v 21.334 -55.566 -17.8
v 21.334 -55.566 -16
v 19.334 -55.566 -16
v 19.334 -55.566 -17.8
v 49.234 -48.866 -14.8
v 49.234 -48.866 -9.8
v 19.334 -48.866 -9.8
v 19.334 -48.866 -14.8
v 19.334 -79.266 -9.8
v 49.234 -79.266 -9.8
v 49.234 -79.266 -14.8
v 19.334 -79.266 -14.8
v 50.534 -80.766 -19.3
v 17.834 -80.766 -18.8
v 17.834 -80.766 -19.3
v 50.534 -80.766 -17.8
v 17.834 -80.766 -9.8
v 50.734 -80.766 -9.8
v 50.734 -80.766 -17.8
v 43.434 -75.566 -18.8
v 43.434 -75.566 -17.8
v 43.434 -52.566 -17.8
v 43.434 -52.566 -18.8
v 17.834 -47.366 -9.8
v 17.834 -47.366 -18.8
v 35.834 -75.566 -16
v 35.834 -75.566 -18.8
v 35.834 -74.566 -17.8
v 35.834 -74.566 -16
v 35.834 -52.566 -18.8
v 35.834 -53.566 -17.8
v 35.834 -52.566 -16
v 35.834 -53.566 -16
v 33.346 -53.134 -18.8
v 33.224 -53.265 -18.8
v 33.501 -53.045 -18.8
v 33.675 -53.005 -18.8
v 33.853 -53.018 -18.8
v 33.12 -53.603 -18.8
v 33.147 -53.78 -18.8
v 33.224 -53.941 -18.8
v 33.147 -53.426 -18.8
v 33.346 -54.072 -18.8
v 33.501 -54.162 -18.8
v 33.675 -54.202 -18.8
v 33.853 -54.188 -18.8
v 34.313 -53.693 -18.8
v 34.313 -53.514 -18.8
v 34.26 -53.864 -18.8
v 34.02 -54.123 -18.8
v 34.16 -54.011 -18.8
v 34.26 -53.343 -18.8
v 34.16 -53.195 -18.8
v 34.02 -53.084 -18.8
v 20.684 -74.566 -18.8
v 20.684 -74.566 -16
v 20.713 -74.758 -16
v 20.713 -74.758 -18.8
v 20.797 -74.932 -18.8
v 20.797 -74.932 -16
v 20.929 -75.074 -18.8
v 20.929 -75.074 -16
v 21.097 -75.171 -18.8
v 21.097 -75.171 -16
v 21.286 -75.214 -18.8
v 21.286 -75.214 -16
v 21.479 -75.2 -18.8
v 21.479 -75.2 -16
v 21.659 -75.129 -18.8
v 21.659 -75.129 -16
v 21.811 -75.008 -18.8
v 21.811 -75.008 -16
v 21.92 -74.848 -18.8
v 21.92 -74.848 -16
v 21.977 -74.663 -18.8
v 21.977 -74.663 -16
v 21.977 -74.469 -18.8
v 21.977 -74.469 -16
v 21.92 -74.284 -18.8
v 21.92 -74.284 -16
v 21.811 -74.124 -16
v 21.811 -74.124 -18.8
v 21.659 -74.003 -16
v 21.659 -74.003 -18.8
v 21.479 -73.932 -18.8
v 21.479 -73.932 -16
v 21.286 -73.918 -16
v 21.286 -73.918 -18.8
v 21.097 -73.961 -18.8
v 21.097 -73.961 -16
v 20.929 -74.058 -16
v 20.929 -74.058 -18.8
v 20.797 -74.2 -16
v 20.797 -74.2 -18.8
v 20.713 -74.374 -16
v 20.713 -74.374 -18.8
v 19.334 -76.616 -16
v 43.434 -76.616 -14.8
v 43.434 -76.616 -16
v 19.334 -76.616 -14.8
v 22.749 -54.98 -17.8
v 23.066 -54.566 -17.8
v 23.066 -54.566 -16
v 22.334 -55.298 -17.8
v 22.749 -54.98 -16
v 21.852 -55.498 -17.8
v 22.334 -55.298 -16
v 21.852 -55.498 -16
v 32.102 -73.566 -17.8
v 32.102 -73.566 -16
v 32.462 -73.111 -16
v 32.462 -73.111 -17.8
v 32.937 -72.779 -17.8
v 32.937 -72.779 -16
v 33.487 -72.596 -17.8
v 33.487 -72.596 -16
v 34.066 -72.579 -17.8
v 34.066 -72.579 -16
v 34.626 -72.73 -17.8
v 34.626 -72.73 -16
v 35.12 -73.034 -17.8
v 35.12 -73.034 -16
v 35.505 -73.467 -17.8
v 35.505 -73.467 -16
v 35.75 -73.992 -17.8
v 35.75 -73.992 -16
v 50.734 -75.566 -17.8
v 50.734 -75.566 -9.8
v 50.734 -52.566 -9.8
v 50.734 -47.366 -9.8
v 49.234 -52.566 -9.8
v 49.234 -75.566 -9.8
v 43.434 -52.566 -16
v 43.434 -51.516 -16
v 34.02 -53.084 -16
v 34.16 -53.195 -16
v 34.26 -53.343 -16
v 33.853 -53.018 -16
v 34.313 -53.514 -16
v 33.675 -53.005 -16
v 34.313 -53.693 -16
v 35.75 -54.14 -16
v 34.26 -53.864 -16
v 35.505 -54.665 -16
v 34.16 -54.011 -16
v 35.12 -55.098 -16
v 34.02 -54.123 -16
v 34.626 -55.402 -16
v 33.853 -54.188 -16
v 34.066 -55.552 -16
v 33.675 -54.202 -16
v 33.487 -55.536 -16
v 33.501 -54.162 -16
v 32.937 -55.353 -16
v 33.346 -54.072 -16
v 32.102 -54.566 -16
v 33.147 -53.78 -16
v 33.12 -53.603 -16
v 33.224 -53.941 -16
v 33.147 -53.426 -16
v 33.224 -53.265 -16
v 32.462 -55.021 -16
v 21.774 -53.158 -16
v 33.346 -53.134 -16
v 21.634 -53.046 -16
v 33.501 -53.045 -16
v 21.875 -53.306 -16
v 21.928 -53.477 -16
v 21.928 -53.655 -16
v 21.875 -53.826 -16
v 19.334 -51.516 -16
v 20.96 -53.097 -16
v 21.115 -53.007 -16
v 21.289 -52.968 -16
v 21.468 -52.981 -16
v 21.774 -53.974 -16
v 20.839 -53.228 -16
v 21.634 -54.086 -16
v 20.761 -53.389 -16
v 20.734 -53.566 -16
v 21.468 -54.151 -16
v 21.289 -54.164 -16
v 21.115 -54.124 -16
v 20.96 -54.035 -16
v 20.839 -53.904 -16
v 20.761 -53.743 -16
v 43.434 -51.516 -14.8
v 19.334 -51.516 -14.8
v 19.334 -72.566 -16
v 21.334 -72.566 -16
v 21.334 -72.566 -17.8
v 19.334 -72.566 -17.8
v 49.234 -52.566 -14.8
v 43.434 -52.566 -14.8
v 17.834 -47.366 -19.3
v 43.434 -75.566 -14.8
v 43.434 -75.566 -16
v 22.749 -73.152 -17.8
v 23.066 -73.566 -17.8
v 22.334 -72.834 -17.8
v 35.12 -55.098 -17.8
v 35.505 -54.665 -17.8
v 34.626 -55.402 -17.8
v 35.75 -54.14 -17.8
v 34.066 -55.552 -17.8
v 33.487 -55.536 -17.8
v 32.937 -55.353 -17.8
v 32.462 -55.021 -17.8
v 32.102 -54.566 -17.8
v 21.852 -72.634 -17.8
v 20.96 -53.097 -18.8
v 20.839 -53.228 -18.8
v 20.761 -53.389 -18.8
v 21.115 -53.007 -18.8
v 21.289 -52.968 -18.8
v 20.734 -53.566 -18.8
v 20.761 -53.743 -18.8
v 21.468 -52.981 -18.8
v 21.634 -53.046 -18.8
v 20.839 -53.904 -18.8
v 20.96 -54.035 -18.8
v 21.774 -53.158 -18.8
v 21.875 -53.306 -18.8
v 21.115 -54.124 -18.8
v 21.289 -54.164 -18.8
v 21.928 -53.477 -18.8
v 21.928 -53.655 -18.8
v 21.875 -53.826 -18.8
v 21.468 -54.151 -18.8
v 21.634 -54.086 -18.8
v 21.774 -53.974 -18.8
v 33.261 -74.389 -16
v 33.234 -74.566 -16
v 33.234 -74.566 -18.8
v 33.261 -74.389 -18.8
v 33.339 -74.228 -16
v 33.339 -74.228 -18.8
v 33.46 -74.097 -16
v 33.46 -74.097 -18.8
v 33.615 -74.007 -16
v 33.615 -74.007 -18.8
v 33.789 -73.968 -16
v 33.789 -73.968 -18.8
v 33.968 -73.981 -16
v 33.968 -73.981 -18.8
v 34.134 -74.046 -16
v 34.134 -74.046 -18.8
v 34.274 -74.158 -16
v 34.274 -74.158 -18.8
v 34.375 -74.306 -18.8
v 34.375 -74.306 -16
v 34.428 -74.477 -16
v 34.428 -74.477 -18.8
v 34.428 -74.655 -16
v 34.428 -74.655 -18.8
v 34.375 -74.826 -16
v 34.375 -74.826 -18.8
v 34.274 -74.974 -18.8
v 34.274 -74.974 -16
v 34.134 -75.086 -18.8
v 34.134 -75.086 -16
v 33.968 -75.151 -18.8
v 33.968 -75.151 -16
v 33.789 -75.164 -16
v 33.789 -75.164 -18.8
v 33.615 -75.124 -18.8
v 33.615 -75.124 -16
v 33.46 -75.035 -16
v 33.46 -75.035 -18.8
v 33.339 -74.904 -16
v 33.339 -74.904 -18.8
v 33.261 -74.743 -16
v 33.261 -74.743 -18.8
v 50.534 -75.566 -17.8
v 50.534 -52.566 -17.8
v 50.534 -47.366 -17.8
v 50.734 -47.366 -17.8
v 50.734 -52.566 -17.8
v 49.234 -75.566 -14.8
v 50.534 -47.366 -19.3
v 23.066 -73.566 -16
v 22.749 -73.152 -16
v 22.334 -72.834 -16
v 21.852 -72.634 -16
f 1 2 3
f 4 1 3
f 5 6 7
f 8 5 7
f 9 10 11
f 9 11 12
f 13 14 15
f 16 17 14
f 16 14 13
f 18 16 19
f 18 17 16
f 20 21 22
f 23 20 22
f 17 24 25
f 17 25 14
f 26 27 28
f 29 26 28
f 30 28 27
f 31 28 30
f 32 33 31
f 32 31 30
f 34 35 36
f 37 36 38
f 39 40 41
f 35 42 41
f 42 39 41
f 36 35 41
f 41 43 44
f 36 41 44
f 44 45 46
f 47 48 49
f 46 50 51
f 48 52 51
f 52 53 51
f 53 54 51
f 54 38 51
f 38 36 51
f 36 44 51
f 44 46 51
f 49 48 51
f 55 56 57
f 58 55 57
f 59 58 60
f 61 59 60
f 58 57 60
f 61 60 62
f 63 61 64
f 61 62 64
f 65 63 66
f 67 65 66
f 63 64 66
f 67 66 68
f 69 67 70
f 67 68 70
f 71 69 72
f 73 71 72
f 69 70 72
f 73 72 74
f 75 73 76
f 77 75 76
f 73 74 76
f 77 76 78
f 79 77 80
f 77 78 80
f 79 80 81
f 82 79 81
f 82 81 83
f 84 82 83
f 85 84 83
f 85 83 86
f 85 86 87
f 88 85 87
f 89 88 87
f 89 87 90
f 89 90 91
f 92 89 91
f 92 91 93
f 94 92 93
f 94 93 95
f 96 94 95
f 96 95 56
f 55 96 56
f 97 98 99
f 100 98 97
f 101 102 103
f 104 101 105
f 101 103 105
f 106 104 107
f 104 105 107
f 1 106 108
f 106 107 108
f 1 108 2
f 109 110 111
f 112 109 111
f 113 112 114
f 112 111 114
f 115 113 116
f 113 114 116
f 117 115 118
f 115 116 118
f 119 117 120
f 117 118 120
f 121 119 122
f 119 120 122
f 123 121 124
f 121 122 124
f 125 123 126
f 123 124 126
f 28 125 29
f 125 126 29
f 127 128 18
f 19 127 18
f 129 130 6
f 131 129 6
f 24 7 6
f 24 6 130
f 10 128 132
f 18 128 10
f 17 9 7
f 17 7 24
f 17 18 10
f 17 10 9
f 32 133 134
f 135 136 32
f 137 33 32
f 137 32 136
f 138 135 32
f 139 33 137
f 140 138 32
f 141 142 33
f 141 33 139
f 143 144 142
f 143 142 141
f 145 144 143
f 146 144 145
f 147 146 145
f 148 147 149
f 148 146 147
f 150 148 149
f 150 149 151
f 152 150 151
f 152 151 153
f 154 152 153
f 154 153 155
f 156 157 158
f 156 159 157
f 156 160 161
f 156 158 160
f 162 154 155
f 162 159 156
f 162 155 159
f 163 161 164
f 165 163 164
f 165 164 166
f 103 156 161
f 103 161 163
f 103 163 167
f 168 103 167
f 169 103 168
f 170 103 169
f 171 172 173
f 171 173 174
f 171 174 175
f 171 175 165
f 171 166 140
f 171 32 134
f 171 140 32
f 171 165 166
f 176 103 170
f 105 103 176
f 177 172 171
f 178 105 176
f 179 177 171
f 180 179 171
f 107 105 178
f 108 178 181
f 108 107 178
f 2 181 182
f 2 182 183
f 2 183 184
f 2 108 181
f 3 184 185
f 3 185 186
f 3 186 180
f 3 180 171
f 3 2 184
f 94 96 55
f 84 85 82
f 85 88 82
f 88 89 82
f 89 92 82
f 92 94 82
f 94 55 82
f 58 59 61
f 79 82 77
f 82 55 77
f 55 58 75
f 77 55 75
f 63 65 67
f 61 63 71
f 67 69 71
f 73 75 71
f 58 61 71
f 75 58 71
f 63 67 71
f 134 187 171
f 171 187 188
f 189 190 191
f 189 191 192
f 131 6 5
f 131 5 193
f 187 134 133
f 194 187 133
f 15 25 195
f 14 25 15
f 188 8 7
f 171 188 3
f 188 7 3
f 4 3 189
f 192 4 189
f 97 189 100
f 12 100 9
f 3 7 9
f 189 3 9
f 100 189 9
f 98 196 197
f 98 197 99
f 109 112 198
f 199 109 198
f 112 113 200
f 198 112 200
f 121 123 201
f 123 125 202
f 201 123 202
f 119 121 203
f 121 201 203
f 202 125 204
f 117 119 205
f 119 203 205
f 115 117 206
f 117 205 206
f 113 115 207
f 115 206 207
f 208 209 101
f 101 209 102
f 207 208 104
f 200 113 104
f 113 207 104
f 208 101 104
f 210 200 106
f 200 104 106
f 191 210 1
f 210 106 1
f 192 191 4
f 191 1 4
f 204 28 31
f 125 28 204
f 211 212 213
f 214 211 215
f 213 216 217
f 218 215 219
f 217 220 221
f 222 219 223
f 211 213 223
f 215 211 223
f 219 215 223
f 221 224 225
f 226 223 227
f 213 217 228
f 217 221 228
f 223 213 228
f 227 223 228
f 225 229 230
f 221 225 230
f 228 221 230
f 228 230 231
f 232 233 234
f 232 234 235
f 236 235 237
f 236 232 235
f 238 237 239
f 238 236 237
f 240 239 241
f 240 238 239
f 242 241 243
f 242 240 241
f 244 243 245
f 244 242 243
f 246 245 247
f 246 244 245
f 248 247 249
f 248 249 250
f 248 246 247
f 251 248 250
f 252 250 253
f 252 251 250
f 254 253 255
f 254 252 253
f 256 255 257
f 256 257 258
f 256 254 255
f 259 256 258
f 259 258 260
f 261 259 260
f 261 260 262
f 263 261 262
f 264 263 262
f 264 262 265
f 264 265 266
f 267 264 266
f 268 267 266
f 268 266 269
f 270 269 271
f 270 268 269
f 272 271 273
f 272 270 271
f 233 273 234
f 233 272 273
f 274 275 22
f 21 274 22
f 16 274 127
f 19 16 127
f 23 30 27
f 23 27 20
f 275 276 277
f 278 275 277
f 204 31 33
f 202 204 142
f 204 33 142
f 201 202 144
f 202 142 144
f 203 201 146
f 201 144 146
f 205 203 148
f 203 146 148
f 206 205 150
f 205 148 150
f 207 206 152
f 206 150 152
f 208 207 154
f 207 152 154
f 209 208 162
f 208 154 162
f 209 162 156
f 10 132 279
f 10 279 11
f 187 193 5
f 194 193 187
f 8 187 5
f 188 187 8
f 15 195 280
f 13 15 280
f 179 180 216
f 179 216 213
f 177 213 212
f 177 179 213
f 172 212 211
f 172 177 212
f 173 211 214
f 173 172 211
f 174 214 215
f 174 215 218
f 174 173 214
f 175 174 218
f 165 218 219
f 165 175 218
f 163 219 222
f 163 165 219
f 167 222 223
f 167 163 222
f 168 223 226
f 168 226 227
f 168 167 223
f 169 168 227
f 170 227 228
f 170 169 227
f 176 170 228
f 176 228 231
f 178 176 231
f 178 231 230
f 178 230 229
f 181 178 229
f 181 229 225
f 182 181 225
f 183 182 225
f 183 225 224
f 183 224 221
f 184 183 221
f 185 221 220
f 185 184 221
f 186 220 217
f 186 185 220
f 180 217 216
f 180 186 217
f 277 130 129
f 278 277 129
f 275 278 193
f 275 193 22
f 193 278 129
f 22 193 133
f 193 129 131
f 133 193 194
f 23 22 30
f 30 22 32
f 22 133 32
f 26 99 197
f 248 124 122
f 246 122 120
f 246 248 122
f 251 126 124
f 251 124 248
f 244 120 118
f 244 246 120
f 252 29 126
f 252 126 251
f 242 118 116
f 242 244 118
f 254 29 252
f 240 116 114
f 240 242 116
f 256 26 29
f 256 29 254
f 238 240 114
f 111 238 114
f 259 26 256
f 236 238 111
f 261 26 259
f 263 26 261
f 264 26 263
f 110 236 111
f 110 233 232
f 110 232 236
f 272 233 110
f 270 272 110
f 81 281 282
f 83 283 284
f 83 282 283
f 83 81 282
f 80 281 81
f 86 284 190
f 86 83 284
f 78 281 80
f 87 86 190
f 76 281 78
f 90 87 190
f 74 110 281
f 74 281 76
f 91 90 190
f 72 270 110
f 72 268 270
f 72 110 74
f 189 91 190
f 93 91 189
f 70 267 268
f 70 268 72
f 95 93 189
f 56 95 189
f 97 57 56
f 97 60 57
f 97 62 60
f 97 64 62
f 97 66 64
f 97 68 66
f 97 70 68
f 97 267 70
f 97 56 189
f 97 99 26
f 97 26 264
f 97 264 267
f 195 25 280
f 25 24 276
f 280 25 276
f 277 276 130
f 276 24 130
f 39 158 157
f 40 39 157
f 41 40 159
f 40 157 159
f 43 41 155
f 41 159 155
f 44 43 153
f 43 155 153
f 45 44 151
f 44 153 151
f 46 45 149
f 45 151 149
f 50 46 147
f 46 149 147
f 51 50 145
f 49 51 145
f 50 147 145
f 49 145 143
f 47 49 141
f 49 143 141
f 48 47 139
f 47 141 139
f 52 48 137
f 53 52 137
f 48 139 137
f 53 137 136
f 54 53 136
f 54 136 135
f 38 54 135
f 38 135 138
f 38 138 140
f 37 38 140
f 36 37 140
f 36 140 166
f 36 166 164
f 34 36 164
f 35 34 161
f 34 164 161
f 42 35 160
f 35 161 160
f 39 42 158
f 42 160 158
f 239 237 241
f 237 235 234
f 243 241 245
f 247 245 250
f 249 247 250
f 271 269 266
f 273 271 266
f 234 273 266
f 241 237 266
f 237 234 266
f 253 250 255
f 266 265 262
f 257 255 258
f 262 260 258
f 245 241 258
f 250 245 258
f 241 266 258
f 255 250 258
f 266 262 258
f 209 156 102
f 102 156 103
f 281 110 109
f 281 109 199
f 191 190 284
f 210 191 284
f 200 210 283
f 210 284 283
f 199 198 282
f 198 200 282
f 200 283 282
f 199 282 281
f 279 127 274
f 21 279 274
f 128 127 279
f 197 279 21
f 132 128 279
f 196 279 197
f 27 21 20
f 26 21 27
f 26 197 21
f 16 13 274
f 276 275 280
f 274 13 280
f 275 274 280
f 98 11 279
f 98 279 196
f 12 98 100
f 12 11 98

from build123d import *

# Parameters (mm, degrees)
RECTANGLE077_W         = 0.2
RECTANGLE077_H         = 33.4
EXTRUDE207_DEPTH       = 1.5
RECTANGLE072_W         = 32.9
RECTANGLE072_H         = 33.4
EXTRUDE172_DEPTH       = 0.5
CIRCLE037_R            = 0.6
EXTRUDE166_DEPTH       = 2.8
CIRCLE036_R            = 0.6
EXTRUDE163_DEPTH       = 2.8
CIRCLE038_R            = 0.6
EXTRUDE165_DEPTH       = 2.8
CIRCLE040_R            = 0.65
EXTRUDE167_DEPTH       = 10
CIRCLE018_R            = 2
EXTRUDE155_DEPTH       = 2.1
RECTANGLE065_W         = 2
RECTANGLE065_H         = 1
EXTRUDE156_DEPTH       = 2.1
RECTANGLE064_W         = 2
RECTANGLE064_H         = 1
EXTRUDE153_DEPTH       = 2.1
CIRCLE019_R            = 2
EXTRUDE152_DEPTH       = 2.1
RECTANGLE066_W         = 1
RECTANGLE066_H         = 1
EXTRUDE150_DEPTH       = 2.1
CIRCLE020_R            = 2
EXTRUDE149_DEPTH       = 2.1
RECTANGLE070_W         = 7.6
RECTANGLE070_H         = 23
EXTRUDE162_DEPTH       = 2.8
RECTANGLE061_W         = 24.1
RECTANGLE061_H         = 25.1
EXTRUDE117_DEPTH       = 6.2
RECTANGLE063_W         = 1.5
RECTANGLE063_H         = 23
EXTRUDE128_DEPTH       = 8
RECTANGLE060_W         = 14.4
RECTANGLE060_H         = 23
EXTRUDE141_DEPTH       = 8
RECTANGLE059_W         = 15.5
RECTANGLE059_H         = 19
EXTRUDE140_DEPTH       = 8
RECTANGLE062_W         = 29.9
RECTANGLE062_H         = 30.4
EXTRUDE116_DEPTH       = 5
RECTANGLE053_W         = 32.9
RECTANGLE053_H         = 33.4
EXTRUDE107_DEPTH       = 9
RECTANGLE067_W         = 1
RECTANGLE067_H         = 1
EXTRUDE159_DEPTH       = 2.1
CIRCLE021_R            = 2
EXTRUDE158_DEPTH       = 2.1
CUT078_PLACEMENT_ANGLE = 180


with BuildPart() as extrude207:
    # Rectangle077 → Extrude207 (new body)
    with BuildSketch(Plane(origin=(50.534308, -80.765974, -19.3), x_dir=(1, 0, 0), z_dir=(0, 0, 1))):
        with Locations((0.1, 16.7)):
            Rectangle(RECTANGLE077_W, RECTANGLE077_H)
    extrude(amount=EXTRUDE207_DEPTH)


with BuildPart() as extrude172:
    # Rectangle072 (on Cut) → Extrude172 (new body)
    with BuildSketch(Plane(origin=(17.834308, -47.365974, -18.8), x_dir=(1, 0, 0), z_dir=(0, 0, -1))):
        with Locations((16.45, 16.7)):
            Rectangle(RECTANGLE072_W, RECTANGLE072_H)
    extrude(amount=EXTRUDE172_DEPTH)


with BuildPart() as extrude166:
    # Circle037 → Extrude166 (new body)
    with BuildSketch(Plane(origin=(67.748726, -53.60327, -3.6), x_dir=(1, 0, 0), z_dir=(0, 0, -1))):
        Circle(CIRCLE037_R)
    extrude(amount=-EXTRUDE166_DEPTH)


with BuildPart() as extrude163:
    # Circle036 → Extrude163 (new body)
    with BuildSketch(Plane(origin=(80.134308, -53.565974, -3.6), x_dir=(1, 0, 0), z_dir=(0, 0, 1))):
        Circle(CIRCLE036_R)
    extrude(amount=EXTRUDE163_DEPTH)


with BuildPart() as extrude165:
    # Circle038 → Extrude165 (new body)
    with BuildSketch(Plane(origin=(67.634308, -74.565974, -3.6), x_dir=(1, 0, 0), z_dir=(0, 0, 1))):
        Circle(CIRCLE038_R)
    extrude(amount=EXTRUDE165_DEPTH)


with BuildPart() as extrude167:
    # Circle040 (on Cut) → Extrude167 (new body)
    with BuildSketch(Plane(origin=(80.134308, -74.565974, -3.6), x_dir=(1, 0, 0), z_dir=(0, 0, -1))):
        Circle(CIRCLE040_R)
    extrude(amount=-EXTRUDE167_DEPTH)


with BuildPart() as extrude155:
    # Circle018 → Extrude155 (new body)
    with BuildSketch(Plane(origin=(80.134308, -53.565974, -3.6), x_dir=(1, 0, 0), z_dir=(0, 0, 1))):
        Circle(CIRCLE018_R)
    extrude(amount=EXTRUDE155_DEPTH)


with BuildPart() as fusion026:
    # Rectangle065 → Extrude156 (new body)
    with BuildSketch(Plane(origin=(80.134308, -55.565974, -3.6), x_dir=(1, 0, 0), z_dir=(0, 0, 1))):
        with Locations((1, 0.5)):
            Rectangle(RECTANGLE065_W, RECTANGLE065_H)
    extrude(amount=EXTRUDE156_DEPTH)

    # Fusion026: union Extrude155
    add(extrude155.part)


with BuildPart() as extrude153:
    # Rectangle064 → Extrude153 (new body)
    with BuildSketch(Plane(origin=(80.134308, -73.565974, -3.6), x_dir=(1, 0, 0), z_dir=(0, 0, 1))):
        with Locations((1, 0.5)):
            Rectangle(RECTANGLE064_W, RECTANGLE064_H)
    extrude(amount=EXTRUDE153_DEPTH)


with BuildPart() as fusion032:
    # Circle019 → Extrude152 (new body)
    with BuildSketch(Plane(origin=(80.134308, -74.565974, -3.6), x_dir=(1, 0, 0), z_dir=(0, 0, 1))):
        Circle(CIRCLE019_R)
    extrude(amount=EXTRUDE152_DEPTH)

    # Fusion032: union Extrude153
    add(extrude153.part)


with BuildPart() as extrude150:
    # Rectangle066 → Extrude150 (new body)
    with BuildSketch(Plane(origin=(65.634308, -75.565974, -3.6), x_dir=(1, 0, 0), z_dir=(0, 0, 1))):
        with Locations((0.5, 0.5)):
            Rectangle(RECTANGLE066_W, RECTANGLE066_H)
    extrude(amount=EXTRUDE150_DEPTH)


with BuildPart() as fusion024:
    # Circle020 → Extrude149 (new body)
    with BuildSketch(Plane(origin=(67.634308, -74.565974, -3.6), x_dir=(1, 0, 0), z_dir=(0, 0, 1))):
        Circle(CIRCLE020_R)
    extrude(amount=EXTRUDE149_DEPTH)

    # Fusion024: union Extrude150
    add(extrude150.part)


with BuildPart() as extrude162:
    # Rectangle070 → Extrude162 (new body)
    with BuildSketch(Plane(origin=(58.034308, -75.565974, -3.6), x_dir=(1, 0, 0), z_dir=(0, 0, 1))):
        with Locations((3.8, 11.5)):
            Rectangle(RECTANGLE070_W, RECTANGLE070_H)
    extrude(amount=EXTRUDE162_DEPTH)


with BuildPart() as extrude117:
    # Rectangle061 → Extrude117 (new body)
    with BuildSketch(Plane(origin=(58.034308, -51.515974, -9.8), x_dir=(1, 0, 0), z_dir=(0, 0, -1))):
        with Locations((12.05, 12.55)):
            Rectangle(RECTANGLE061_W, RECTANGLE061_H)
    extrude(amount=-EXTRUDE117_DEPTH)


with BuildPart() as extrude128:
    # Rectangle063 → Extrude128 (new body)
    with BuildSketch(Plane(origin=(50.734308, -75.565974, -9.8), x_dir=(1, 0, 0), z_dir=(0, 0, 1))):
        with Locations((0.75, 11.5)):
            Rectangle(RECTANGLE063_W, RECTANGLE063_H)
    extrude(amount=EXTRUDE128_DEPTH)


with BuildPart() as extrude141:
    # Rectangle060 → Extrude141 (new body)
    with BuildSketch(Plane(origin=(52.234308, -52.565974, -9.8), x_dir=(1, 0, 0), z_dir=(0, 0, -1))):
        with Locations((7.2, 11.5)):
            Rectangle(RECTANGLE060_W, RECTANGLE060_H)
    extrude(amount=-EXTRUDE141_DEPTH)


with BuildPart() as extrude140:
    # Rectangle059 → Extrude140 (new body)
    with BuildSketch(Plane(origin=(66.634308, -54.565974, -9.8), x_dir=(1, 0, 0), z_dir=(0, 0, -1))):
        with Locations((7.75, 9.5)):
            Rectangle(RECTANGLE059_W, RECTANGLE059_H)
    extrude(amount=-EXTRUDE140_DEPTH)


with BuildPart() as extrude116:
    # Rectangle062 → Extrude116 (new body)
    with BuildSketch(Plane(origin=(52.234308, -48.865974, -9.8), x_dir=(1, 0, 0), z_dir=(0, 0, -1))):
        with Locations((14.95, 15.2)):
            Rectangle(RECTANGLE062_W, RECTANGLE062_H)
    extrude(amount=-EXTRUDE116_DEPTH)


with BuildPart() as cut074:
    # Rectangle053 → Extrude107 (new body)
    with BuildSketch(Plane(origin=(50.734308, -47.365974, -9.8), x_dir=(1, 0, 0), z_dir=(0, 0, -1))):
        with Locations((16.45, 16.7)):
            Rectangle(RECTANGLE053_W, RECTANGLE053_H)
    extrude(amount=-EXTRUDE107_DEPTH)

    # Cut046: cut Extrude116
    add(extrude116.part, mode=Mode.SUBTRACT)

    # Cut060: cut Extrude140
    add(extrude140.part, mode=Mode.SUBTRACT)

    # Cut061: cut Extrude141
    add(extrude141.part, mode=Mode.SUBTRACT)

    # Cut062: cut Extrude128
    add(extrude128.part, mode=Mode.SUBTRACT)

    # Cut063: cut Extrude117
    add(extrude117.part, mode=Mode.SUBTRACT)

    # Cut074: cut Extrude162
    add(extrude162.part, mode=Mode.SUBTRACT)


with BuildPart() as extrude159:
    # Rectangle067 → Extrude159 (new body)
    with BuildSketch(Plane(origin=(65.634308, -53.565974, -3.6), x_dir=(1, 0, 0), z_dir=(0, 0, 1))):
        with Locations((0.5, 0.5)):
            Rectangle(RECTANGLE067_W, RECTANGLE067_H)
    extrude(amount=EXTRUDE159_DEPTH)


with BuildPart() as cut_lens_capsule:
    # Circle021 → Extrude158 (new body)
    with BuildSketch(Plane(origin=(67.634308, -53.565974, -3.6), x_dir=(1, 0, 0), z_dir=(0, 0, 1))):
        Circle(CIRCLE021_R)
    extrude(amount=EXTRUDE158_DEPTH)

    # Fusion025: union Extrude159
    add(extrude159.part)

    # Fusion033: union Fusion026, Fusion032, Fusion024, Cut074
    add(fusion026.part)
    add(fusion032.part)
    add(fusion024.part)
    add(cut074.part)

    # Cut075: cut Extrude167
    add(extrude167.part, mode=Mode.SUBTRACT)

    # Cut076: cut Extrude165
    add(extrude165.part, mode=Mode.SUBTRACT)

    # Cut077: cut Extrude163
    add(extrude163.part, mode=Mode.SUBTRACT)

    # Cut078: cut Extrude166
    add(extrude166.part, mode=Mode.SUBTRACT)


with BuildPart() as cut_lens_capsule_1:
    # Cut078 placement: moved
    add(cut_lens_capsule.part.moved(Location((101.468615, 0, -19.6))).rotate(Axis((101.468615, 0, -19.6), (0, 1, 0)), CUT078_PLACEMENT_ANGLE))

    # Fusion035: union Extrude172
    add(extrude172.part)

    # Cut108: cut Extrude207
    add(extrude207.part, mode=Mode.SUBTRACT)


solid = cut_lens_capsule_1.part
